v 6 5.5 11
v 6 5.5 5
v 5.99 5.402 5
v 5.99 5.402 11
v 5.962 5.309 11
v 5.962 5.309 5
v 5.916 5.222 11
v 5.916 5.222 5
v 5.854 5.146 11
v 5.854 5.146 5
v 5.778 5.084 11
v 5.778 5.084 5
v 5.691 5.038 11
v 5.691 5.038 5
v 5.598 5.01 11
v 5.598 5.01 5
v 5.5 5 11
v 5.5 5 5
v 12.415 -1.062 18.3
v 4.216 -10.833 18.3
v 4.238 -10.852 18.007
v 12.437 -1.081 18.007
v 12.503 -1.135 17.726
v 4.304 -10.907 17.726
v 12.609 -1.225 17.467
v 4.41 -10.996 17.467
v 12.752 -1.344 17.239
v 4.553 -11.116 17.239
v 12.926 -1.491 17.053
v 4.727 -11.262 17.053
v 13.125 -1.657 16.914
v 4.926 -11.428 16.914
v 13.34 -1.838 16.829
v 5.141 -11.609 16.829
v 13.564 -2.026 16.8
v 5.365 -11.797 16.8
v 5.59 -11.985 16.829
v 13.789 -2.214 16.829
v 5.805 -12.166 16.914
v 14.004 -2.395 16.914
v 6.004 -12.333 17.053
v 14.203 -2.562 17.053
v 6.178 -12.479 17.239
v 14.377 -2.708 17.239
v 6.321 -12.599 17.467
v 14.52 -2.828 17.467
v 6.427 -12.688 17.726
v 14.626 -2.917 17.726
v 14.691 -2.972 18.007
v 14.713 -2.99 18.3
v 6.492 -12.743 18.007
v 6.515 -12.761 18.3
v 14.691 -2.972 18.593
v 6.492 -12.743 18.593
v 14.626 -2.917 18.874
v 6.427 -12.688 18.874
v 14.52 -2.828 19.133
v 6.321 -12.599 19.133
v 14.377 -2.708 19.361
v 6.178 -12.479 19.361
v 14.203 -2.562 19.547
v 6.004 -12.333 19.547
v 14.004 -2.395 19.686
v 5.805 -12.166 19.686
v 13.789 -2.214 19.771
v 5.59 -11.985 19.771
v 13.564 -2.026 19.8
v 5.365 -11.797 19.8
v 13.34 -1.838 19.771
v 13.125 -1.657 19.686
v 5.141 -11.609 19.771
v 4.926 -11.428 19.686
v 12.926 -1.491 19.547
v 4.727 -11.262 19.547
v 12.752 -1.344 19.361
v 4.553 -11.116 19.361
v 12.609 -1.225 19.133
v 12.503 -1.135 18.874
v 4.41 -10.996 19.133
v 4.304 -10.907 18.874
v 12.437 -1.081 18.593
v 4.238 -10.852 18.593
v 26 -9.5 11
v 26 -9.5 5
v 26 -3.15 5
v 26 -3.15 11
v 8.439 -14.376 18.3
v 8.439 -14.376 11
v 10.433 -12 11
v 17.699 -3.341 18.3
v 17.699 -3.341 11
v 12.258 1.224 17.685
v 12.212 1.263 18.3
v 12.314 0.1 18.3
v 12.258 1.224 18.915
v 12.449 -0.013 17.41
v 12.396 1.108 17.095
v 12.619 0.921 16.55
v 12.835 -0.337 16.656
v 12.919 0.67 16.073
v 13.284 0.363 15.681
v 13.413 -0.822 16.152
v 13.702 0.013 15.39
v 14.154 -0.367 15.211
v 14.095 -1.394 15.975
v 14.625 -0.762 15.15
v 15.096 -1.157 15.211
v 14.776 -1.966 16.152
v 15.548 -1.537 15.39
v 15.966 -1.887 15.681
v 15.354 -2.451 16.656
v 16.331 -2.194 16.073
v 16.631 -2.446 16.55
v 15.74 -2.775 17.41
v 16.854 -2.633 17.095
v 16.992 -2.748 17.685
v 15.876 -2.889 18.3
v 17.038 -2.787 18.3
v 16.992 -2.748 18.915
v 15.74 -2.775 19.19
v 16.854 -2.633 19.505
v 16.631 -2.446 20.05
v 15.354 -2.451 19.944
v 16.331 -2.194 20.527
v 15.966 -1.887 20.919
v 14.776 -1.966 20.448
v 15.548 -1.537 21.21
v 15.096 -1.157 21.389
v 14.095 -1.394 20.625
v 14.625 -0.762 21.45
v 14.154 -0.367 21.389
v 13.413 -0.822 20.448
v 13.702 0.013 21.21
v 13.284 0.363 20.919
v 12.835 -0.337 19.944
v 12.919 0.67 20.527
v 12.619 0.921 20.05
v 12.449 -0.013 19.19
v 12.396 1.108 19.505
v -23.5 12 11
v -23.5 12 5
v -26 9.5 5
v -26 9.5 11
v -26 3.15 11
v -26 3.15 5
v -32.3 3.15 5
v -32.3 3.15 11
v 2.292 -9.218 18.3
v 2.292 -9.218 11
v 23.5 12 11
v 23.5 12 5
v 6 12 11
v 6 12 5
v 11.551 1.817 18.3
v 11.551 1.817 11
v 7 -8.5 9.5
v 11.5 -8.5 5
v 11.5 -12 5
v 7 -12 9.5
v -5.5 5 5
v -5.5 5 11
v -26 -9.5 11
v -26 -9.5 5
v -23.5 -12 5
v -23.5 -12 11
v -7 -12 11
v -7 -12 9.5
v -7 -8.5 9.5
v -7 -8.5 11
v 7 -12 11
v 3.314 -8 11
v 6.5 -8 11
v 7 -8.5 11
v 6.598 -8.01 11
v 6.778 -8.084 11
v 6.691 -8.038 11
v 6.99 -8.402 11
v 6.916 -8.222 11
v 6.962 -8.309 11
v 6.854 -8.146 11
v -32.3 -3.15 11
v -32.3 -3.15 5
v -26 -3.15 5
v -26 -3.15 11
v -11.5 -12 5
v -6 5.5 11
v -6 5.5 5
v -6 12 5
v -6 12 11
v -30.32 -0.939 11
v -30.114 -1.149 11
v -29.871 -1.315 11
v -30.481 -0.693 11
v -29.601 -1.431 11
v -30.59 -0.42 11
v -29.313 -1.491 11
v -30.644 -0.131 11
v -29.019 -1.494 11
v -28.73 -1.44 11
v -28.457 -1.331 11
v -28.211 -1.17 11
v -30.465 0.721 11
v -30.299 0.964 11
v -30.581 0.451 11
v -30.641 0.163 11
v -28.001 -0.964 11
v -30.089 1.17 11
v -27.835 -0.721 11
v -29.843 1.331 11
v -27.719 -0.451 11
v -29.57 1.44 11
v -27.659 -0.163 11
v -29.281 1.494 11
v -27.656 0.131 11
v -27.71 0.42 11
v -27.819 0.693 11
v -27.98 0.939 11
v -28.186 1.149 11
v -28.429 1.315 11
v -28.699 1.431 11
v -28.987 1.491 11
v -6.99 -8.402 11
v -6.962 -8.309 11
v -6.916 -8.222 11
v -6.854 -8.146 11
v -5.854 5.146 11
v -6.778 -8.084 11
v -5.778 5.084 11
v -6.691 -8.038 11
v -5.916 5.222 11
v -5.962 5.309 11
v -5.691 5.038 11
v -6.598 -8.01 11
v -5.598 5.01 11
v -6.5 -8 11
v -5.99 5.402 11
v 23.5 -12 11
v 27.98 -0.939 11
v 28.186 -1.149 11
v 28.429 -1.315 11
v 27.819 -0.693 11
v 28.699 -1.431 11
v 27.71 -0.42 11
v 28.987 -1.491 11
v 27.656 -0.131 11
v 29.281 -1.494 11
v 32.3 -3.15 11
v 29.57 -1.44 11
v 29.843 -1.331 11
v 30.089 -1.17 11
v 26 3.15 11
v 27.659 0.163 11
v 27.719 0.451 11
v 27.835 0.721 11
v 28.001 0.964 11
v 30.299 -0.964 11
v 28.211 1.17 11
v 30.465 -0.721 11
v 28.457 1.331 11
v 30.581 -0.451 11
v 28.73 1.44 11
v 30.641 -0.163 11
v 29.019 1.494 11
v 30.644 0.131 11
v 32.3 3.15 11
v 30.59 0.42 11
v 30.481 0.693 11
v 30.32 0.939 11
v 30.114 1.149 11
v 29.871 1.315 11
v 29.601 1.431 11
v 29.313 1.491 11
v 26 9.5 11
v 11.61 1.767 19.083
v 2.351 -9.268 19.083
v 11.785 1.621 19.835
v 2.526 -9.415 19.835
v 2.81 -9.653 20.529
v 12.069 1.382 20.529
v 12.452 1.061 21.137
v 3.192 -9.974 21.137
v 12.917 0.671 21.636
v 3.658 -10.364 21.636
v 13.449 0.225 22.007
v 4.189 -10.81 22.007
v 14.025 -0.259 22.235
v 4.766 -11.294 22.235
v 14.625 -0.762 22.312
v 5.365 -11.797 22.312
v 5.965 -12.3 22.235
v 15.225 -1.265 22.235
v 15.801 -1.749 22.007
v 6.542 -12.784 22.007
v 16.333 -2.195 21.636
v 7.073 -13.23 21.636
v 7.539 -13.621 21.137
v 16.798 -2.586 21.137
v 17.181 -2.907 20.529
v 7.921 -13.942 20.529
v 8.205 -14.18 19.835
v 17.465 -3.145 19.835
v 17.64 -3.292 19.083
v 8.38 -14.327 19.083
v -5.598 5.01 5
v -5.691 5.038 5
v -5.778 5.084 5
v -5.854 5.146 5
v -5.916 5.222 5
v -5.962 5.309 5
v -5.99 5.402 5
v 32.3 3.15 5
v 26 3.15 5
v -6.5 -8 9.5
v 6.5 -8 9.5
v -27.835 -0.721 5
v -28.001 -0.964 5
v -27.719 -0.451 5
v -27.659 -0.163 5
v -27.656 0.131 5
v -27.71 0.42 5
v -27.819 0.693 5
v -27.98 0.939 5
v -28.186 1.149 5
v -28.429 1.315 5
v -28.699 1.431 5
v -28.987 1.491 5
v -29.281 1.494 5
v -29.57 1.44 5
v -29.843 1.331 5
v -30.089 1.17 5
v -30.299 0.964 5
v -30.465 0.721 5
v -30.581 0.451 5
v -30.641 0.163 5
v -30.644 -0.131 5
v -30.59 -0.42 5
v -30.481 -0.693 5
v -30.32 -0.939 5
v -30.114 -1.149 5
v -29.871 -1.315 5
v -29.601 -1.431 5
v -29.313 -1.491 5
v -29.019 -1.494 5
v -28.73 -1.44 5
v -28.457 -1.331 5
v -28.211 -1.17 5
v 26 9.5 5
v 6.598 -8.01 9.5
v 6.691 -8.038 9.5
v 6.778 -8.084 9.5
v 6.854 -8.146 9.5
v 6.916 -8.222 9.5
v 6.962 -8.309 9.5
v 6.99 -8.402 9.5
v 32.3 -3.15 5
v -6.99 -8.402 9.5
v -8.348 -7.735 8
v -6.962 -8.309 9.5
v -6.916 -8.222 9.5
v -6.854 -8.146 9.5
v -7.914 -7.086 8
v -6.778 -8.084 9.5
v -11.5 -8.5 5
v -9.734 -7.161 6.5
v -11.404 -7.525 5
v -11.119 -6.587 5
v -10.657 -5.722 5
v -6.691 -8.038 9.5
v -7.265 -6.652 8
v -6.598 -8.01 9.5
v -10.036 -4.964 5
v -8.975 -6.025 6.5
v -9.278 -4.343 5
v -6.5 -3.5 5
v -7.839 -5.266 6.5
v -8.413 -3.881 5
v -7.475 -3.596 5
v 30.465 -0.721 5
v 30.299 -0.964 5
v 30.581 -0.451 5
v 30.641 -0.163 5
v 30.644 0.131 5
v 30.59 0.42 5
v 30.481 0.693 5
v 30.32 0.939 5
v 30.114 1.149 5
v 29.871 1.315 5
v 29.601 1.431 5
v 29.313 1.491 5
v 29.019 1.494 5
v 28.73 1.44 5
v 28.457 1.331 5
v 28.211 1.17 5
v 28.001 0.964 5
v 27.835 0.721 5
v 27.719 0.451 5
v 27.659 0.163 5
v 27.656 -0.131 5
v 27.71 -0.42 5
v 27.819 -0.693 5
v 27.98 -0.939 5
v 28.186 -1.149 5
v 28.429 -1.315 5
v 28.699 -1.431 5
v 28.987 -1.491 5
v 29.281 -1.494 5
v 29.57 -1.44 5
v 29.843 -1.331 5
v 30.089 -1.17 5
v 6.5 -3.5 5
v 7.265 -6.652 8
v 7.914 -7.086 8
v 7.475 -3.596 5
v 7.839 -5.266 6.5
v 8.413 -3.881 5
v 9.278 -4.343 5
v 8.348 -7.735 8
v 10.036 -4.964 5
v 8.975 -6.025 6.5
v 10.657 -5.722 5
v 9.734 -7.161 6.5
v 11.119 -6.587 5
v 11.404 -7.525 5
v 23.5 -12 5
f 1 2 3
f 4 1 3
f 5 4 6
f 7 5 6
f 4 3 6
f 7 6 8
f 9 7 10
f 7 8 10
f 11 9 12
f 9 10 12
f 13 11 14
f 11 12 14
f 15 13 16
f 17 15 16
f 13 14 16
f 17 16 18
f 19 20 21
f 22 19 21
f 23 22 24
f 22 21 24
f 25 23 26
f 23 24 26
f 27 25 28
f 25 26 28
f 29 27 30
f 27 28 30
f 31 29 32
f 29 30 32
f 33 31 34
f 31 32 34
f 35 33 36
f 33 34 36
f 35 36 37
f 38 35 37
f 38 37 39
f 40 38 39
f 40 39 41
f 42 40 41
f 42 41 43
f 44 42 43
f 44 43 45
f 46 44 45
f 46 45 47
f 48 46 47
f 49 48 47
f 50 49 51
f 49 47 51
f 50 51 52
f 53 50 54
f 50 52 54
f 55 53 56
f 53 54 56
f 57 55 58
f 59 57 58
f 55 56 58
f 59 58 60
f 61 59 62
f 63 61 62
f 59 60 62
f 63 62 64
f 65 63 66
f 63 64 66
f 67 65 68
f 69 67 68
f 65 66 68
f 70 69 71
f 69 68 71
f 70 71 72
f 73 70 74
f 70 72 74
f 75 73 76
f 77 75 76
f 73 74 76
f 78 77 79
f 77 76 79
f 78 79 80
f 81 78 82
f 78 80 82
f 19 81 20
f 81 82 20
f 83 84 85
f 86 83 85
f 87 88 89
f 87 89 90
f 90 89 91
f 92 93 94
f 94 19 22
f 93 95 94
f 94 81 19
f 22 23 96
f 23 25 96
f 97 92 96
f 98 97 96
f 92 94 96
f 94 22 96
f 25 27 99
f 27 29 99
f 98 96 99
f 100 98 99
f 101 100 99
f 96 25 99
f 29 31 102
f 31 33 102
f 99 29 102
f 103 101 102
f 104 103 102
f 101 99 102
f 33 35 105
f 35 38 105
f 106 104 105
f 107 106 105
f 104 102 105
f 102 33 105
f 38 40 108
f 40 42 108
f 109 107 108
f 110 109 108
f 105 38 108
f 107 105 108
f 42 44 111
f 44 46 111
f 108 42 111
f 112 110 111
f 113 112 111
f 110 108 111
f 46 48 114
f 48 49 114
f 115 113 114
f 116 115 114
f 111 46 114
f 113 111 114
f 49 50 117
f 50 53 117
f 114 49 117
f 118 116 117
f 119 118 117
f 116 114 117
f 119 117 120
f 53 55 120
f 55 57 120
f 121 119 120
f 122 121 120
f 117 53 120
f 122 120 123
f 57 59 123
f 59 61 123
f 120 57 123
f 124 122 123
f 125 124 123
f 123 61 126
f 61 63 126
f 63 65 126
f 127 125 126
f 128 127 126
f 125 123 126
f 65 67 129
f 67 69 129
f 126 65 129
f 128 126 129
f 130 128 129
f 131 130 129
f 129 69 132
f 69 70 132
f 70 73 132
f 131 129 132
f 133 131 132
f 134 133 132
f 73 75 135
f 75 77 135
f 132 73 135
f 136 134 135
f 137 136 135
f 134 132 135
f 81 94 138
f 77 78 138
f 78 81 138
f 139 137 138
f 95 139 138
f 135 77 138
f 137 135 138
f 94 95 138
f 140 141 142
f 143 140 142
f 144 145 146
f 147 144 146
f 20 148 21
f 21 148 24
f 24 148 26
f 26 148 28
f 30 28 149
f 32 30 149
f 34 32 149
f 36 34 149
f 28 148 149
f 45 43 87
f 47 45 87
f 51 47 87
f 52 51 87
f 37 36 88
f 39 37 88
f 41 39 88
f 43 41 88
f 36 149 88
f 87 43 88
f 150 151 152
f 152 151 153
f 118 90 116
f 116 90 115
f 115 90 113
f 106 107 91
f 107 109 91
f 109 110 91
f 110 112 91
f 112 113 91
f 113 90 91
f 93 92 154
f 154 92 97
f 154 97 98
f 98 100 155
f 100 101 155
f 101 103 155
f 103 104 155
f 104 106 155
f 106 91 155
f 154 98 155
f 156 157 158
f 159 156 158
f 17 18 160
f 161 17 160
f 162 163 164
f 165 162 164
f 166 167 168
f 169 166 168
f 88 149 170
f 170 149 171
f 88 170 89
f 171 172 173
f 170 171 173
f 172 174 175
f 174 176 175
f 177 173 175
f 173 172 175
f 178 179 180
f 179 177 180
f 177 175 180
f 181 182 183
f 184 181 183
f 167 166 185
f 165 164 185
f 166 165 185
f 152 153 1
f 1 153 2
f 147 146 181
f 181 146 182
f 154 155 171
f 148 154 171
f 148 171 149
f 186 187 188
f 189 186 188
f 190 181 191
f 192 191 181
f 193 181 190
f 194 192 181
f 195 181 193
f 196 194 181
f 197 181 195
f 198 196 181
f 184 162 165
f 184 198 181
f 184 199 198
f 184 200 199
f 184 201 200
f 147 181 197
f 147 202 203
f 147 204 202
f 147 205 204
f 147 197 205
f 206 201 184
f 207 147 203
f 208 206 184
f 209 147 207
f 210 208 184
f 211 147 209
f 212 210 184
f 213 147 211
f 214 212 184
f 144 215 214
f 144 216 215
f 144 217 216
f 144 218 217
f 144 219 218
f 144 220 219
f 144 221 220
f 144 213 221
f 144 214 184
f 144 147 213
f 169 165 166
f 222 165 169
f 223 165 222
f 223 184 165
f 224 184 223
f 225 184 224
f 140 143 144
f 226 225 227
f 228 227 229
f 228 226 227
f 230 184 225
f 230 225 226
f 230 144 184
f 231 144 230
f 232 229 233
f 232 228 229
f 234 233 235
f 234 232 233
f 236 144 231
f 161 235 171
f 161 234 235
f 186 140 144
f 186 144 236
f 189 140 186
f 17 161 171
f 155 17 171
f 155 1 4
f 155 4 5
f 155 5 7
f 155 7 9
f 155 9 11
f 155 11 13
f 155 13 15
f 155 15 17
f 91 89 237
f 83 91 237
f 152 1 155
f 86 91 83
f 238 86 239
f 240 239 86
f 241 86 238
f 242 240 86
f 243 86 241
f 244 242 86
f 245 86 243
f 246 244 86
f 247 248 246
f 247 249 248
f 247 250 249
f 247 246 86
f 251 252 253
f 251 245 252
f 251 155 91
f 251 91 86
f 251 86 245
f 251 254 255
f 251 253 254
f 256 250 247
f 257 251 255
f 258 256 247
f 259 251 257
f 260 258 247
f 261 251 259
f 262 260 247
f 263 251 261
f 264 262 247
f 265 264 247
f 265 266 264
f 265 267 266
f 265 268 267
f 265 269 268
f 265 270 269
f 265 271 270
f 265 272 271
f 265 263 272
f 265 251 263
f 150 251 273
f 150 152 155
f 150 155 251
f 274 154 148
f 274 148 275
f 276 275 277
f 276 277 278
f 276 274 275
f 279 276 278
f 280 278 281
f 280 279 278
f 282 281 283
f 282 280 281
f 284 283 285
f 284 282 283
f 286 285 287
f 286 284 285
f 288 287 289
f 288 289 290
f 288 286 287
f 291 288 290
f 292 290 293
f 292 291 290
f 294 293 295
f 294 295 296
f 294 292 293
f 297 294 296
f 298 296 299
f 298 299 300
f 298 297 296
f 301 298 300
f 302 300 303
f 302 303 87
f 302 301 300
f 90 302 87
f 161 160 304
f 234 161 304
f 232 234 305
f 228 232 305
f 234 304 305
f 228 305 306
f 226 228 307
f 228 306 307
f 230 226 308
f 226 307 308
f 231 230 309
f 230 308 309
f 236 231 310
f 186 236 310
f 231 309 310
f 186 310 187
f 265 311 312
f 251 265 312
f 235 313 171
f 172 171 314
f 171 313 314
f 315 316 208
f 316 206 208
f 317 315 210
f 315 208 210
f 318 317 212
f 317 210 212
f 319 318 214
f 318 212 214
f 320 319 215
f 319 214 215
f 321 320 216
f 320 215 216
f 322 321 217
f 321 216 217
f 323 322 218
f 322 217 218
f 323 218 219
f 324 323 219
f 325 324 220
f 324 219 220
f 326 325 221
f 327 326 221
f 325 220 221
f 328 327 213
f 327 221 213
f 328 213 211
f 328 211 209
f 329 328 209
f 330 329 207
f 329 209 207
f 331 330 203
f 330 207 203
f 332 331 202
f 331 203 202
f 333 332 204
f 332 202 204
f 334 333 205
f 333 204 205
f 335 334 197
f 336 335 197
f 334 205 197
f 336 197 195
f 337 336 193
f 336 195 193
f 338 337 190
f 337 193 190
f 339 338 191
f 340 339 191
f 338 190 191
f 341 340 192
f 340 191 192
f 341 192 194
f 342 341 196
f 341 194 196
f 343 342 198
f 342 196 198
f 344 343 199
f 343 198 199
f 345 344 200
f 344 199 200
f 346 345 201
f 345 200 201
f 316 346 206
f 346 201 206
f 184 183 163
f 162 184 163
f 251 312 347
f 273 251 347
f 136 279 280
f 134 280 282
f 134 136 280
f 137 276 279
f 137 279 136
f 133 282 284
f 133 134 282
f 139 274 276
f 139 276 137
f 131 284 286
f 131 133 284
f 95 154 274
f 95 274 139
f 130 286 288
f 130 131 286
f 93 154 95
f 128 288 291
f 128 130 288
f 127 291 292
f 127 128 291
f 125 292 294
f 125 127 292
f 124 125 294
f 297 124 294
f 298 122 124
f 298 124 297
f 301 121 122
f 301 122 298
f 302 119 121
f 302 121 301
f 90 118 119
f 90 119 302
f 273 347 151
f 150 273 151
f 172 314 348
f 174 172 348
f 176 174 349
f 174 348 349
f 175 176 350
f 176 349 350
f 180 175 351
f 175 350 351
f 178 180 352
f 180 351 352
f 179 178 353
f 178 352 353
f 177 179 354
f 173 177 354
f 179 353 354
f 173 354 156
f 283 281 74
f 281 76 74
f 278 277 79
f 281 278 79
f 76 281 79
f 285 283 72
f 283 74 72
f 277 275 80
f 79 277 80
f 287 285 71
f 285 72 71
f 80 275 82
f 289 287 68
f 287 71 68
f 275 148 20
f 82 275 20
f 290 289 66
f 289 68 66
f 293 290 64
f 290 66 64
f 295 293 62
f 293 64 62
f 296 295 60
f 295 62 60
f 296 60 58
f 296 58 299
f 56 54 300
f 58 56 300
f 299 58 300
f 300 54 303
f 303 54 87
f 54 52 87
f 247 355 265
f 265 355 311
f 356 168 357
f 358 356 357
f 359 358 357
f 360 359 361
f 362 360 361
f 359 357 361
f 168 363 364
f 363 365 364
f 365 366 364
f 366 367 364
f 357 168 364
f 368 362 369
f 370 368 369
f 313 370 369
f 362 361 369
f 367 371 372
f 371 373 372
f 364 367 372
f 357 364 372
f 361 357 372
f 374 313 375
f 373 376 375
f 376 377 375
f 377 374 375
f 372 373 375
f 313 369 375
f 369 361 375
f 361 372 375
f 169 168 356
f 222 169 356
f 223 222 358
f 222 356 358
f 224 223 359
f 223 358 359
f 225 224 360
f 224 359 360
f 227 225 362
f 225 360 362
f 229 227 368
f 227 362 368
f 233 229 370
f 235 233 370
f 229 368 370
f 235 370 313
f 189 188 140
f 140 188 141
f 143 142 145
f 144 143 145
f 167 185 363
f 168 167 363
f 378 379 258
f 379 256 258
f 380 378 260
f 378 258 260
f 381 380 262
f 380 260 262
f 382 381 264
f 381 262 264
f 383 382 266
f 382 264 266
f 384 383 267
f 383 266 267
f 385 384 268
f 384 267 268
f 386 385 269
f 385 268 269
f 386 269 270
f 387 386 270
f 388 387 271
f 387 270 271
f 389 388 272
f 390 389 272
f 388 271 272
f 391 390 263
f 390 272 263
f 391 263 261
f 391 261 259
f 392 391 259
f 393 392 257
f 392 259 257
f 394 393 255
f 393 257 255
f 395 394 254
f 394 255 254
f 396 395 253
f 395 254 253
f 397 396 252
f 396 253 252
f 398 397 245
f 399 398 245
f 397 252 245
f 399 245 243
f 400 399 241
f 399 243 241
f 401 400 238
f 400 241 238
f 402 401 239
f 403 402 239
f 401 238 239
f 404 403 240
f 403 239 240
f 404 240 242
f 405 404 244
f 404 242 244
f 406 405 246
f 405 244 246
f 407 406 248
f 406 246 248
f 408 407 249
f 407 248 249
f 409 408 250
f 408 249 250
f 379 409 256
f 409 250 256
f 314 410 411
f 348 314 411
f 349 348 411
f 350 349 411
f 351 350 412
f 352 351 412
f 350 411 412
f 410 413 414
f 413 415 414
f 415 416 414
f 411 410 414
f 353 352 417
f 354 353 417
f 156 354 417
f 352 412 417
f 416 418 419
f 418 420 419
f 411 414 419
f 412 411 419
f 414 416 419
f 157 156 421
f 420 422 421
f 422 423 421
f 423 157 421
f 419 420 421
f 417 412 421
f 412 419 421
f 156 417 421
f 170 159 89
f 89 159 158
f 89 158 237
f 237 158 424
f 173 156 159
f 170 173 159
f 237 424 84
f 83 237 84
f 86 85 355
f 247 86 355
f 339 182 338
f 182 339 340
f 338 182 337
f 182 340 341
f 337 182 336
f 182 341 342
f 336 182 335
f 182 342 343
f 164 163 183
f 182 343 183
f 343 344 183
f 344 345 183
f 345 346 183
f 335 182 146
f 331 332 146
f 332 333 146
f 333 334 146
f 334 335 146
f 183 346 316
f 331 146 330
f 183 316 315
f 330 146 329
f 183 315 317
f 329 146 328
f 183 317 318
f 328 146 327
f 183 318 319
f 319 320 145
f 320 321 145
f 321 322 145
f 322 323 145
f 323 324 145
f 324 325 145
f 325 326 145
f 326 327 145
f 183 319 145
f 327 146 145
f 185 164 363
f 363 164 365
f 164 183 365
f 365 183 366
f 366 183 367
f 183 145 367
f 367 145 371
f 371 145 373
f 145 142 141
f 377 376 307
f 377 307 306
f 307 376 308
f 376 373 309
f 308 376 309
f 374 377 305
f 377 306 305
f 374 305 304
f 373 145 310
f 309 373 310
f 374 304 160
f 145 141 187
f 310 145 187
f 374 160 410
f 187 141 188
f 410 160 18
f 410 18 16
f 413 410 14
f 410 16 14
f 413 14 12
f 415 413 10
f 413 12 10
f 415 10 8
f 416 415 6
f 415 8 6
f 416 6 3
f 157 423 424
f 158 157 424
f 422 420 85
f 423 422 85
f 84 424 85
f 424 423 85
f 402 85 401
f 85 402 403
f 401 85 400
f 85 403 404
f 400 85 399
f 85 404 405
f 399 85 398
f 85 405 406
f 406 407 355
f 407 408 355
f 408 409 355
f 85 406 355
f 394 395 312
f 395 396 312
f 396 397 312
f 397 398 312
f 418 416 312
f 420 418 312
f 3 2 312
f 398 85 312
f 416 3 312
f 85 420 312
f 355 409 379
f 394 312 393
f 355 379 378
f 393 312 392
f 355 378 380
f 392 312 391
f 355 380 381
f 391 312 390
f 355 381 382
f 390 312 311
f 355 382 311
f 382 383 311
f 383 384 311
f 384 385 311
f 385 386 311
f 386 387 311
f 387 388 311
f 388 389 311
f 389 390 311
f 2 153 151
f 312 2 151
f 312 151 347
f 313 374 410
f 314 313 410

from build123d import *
from build123d.topology import SkipClean

# Parameters (mm, degrees)
BOSS_EXTRUDE1_START           = 5
BOSS_EXTRUDE1_DEPTH           = 6
CHAMFER1_SIZE                 = 4.5
SKETCH2_W                     = 6
SKETCH2_H                     = 6.3
BOSS_EXTRUDE2_DEPTH           = 6.3
BOSS_EXTRUDE3_DEPTH           = 7.3
BOSS_EXTRUDE4_DEPTH           = 14.405295
CSK_FOR_M3_SFHCS1_D           = 3
CSK_FOR_M3_SFHCS1_CSINK_D     = 6.3
CSK_FOR_M3_SFHCS1_CSINK_ANGLE = 90
CSK_FOR_M3_SFHCS2_D           = 3
CSK_FOR_M3_SFHCS2_CSINK_D     = 6.3
CSK_FOR_M3_SFHCS2_CSINK_ANGLE = 90


with BuildPart() as part:
    # Sketch1 → Boss-Extrude1 (new body)
    with BuildSketch(Plane.XY.offset(BOSS_EXTRUDE1_START)):
        with BuildLine():
            Line((-23.5, -12), (-7, -12))
            Line((-7, -12), (-7, -8.5))
            ThreePointArc((-7, -8.5), (-6.853553391, -8.146446609), (-6.5, -8))
            Line((-6.5, -8), (6.5, -8))
            ThreePointArc((6.5, -8), (6.853553391, -8.146446609), (7, -8.5))
            Line((7, -8.5), (7, -12))
            Line((7, -12), (23.5, -12))
            Line((23.5, -12), (26, -9.5))
            Line((26, -9.5), (26, -3.15))
            Line((26, -3.15), (32.3, -3.15))
            Line((32.3, -3.15), (32.3, 3.15))
            Line((32.3, 3.15), (26, 3.15))
            Line((26, 3.15), (26, 9.5))
            Line((26, 9.5), (23.5, 12))
            Line((23.5, 12), (6, 12))
            Line((6, 12), (6, 5.5))
            ThreePointArc((6, 5.5), (5.853553391, 5.146446609), (5.5, 5))
            Line((5.5, 5), (-5.5, 5))
            ThreePointArc((-5.5, 5), (-5.853553391, 5.146446609), (-6, 5.5))
            Line((-6, 5.5), (-6, 12))
            Line((-6, 12), (-23.5, 12))
            Line((-23.5, 12), (-26, 9.5))
            Line((-26, 9.5), (-26, 3.15))
            Line((-26, 3.15), (-32.3, 3.15))
            Line((-32.3, 3.15), (-32.3, -3.15))
            Line((-32.3, -3.15), (-26, -3.15))
            Line((-26, -3.15), (-26, -9.5))
            Line((-26, -9.5), (-23.5, -12))
        make_face()
    extrude(amount=BOSS_EXTRUDE1_DEPTH)

    # Chamfer1
    chamfer1_edges = [part.edges().sort_by_distance(p)[0] for p in [
        (7, -10.25, 5),
        (6.853553391, -8.146446609, 5),
        (0, -8, 5),
        (-6.853553391, -8.146446609, 5),
        (-7, -10.25, 5),
    ]]
    chamfer(chamfer1_edges, length=CHAMFER1_SIZE)

    # Sketch2 → Boss-Extrude2 (add)
    with BuildSketch(Plane(origin=(26, 0, 0), x_dir=(0, 0, -1), z_dir=(1, 0, 0))):
        with Locations((-8, 0)):
            Rectangle(SKETCH2_W, SKETCH2_H)
    boss_extrude2 = extrude(amount=BOSS_EXTRUDE2_DEPTH)

    # Mirror1: Boss-Extrude2 across plane
    add(boss_extrude2.mirror(Plane(origin=(0, 0, 0), x_dir=(0, 0, 1), z_dir=(1, 0, 0))))

    # Sketch3 → Boss-Extrude3 (add)
    with BuildSketch(Plane.XY.offset(11)):
        Polygon((11.551404138, 1.816830905), (2.291859281, -9.218264944), (8.439052056, -14.376372134), (17.698596913, -3.341276285), align=None)
    extrude(amount=BOSS_EXTRUDE3_DEPTH)

    # Sketch4 → Boss-Extrude4 (add)
    with SkipClean():  # the faces are left unmerged after this step: merging them gives an invalid solid
        with BuildSketch(Plane(origin=(5.667376511, 6.754116317, 0), x_dir=(0.7660444431189792, -0.6427876096865379, 0), z_dir=(0.6427876096865379, 0.7660444431189792, 0))):
            with BuildLine():
                Line((15.705642813, -18.3), (7.681052555, -18.3))
                ThreePointArc((7.681052555, -18.3), (11.693347684, -22.312295129), (15.705642813, -18.3))
            make_face()
        extrude(amount=-BOSS_EXTRUDE4_DEPTH)

    # CSK for M3 SFHCS1 (through all)
    with Locations(Plane(origin=(5.667376511, 6.754116317, 0), x_dir=(0.7660444431189792, -0.6427876096865379, 0), z_dir=(0.6427876096865379, 0.7660444431189792, 0))):
        with Locations((11.693347684, -18.3)):
            CounterSinkHole(CSK_FOR_M3_SFHCS1_D / 2, CSK_FOR_M3_SFHCS1_CSINK_D / 2, counter_sink_angle=CSK_FOR_M3_SFHCS1_CSINK_ANGLE)

    # CSK for M3 SFHCS2 (through all)
    with Locations(Plane(origin=(-1490.377712475, -7.825775805, -12), x_dir=(-0.766044443118981, 0.6427876096865359, 0), z_dir=(0, 0, -1))):
        with Locations((-1114.335057549, 945.253960578), (-1158.995448583, 982.728478223)):
            CounterSinkHole(CSK_FOR_M3_SFHCS2_D / 2, CSK_FOR_M3_SFHCS2_CSINK_D / 2, counter_sink_angle=CSK_FOR_M3_SFHCS2_CSINK_ANGLE)


solid = part.part
